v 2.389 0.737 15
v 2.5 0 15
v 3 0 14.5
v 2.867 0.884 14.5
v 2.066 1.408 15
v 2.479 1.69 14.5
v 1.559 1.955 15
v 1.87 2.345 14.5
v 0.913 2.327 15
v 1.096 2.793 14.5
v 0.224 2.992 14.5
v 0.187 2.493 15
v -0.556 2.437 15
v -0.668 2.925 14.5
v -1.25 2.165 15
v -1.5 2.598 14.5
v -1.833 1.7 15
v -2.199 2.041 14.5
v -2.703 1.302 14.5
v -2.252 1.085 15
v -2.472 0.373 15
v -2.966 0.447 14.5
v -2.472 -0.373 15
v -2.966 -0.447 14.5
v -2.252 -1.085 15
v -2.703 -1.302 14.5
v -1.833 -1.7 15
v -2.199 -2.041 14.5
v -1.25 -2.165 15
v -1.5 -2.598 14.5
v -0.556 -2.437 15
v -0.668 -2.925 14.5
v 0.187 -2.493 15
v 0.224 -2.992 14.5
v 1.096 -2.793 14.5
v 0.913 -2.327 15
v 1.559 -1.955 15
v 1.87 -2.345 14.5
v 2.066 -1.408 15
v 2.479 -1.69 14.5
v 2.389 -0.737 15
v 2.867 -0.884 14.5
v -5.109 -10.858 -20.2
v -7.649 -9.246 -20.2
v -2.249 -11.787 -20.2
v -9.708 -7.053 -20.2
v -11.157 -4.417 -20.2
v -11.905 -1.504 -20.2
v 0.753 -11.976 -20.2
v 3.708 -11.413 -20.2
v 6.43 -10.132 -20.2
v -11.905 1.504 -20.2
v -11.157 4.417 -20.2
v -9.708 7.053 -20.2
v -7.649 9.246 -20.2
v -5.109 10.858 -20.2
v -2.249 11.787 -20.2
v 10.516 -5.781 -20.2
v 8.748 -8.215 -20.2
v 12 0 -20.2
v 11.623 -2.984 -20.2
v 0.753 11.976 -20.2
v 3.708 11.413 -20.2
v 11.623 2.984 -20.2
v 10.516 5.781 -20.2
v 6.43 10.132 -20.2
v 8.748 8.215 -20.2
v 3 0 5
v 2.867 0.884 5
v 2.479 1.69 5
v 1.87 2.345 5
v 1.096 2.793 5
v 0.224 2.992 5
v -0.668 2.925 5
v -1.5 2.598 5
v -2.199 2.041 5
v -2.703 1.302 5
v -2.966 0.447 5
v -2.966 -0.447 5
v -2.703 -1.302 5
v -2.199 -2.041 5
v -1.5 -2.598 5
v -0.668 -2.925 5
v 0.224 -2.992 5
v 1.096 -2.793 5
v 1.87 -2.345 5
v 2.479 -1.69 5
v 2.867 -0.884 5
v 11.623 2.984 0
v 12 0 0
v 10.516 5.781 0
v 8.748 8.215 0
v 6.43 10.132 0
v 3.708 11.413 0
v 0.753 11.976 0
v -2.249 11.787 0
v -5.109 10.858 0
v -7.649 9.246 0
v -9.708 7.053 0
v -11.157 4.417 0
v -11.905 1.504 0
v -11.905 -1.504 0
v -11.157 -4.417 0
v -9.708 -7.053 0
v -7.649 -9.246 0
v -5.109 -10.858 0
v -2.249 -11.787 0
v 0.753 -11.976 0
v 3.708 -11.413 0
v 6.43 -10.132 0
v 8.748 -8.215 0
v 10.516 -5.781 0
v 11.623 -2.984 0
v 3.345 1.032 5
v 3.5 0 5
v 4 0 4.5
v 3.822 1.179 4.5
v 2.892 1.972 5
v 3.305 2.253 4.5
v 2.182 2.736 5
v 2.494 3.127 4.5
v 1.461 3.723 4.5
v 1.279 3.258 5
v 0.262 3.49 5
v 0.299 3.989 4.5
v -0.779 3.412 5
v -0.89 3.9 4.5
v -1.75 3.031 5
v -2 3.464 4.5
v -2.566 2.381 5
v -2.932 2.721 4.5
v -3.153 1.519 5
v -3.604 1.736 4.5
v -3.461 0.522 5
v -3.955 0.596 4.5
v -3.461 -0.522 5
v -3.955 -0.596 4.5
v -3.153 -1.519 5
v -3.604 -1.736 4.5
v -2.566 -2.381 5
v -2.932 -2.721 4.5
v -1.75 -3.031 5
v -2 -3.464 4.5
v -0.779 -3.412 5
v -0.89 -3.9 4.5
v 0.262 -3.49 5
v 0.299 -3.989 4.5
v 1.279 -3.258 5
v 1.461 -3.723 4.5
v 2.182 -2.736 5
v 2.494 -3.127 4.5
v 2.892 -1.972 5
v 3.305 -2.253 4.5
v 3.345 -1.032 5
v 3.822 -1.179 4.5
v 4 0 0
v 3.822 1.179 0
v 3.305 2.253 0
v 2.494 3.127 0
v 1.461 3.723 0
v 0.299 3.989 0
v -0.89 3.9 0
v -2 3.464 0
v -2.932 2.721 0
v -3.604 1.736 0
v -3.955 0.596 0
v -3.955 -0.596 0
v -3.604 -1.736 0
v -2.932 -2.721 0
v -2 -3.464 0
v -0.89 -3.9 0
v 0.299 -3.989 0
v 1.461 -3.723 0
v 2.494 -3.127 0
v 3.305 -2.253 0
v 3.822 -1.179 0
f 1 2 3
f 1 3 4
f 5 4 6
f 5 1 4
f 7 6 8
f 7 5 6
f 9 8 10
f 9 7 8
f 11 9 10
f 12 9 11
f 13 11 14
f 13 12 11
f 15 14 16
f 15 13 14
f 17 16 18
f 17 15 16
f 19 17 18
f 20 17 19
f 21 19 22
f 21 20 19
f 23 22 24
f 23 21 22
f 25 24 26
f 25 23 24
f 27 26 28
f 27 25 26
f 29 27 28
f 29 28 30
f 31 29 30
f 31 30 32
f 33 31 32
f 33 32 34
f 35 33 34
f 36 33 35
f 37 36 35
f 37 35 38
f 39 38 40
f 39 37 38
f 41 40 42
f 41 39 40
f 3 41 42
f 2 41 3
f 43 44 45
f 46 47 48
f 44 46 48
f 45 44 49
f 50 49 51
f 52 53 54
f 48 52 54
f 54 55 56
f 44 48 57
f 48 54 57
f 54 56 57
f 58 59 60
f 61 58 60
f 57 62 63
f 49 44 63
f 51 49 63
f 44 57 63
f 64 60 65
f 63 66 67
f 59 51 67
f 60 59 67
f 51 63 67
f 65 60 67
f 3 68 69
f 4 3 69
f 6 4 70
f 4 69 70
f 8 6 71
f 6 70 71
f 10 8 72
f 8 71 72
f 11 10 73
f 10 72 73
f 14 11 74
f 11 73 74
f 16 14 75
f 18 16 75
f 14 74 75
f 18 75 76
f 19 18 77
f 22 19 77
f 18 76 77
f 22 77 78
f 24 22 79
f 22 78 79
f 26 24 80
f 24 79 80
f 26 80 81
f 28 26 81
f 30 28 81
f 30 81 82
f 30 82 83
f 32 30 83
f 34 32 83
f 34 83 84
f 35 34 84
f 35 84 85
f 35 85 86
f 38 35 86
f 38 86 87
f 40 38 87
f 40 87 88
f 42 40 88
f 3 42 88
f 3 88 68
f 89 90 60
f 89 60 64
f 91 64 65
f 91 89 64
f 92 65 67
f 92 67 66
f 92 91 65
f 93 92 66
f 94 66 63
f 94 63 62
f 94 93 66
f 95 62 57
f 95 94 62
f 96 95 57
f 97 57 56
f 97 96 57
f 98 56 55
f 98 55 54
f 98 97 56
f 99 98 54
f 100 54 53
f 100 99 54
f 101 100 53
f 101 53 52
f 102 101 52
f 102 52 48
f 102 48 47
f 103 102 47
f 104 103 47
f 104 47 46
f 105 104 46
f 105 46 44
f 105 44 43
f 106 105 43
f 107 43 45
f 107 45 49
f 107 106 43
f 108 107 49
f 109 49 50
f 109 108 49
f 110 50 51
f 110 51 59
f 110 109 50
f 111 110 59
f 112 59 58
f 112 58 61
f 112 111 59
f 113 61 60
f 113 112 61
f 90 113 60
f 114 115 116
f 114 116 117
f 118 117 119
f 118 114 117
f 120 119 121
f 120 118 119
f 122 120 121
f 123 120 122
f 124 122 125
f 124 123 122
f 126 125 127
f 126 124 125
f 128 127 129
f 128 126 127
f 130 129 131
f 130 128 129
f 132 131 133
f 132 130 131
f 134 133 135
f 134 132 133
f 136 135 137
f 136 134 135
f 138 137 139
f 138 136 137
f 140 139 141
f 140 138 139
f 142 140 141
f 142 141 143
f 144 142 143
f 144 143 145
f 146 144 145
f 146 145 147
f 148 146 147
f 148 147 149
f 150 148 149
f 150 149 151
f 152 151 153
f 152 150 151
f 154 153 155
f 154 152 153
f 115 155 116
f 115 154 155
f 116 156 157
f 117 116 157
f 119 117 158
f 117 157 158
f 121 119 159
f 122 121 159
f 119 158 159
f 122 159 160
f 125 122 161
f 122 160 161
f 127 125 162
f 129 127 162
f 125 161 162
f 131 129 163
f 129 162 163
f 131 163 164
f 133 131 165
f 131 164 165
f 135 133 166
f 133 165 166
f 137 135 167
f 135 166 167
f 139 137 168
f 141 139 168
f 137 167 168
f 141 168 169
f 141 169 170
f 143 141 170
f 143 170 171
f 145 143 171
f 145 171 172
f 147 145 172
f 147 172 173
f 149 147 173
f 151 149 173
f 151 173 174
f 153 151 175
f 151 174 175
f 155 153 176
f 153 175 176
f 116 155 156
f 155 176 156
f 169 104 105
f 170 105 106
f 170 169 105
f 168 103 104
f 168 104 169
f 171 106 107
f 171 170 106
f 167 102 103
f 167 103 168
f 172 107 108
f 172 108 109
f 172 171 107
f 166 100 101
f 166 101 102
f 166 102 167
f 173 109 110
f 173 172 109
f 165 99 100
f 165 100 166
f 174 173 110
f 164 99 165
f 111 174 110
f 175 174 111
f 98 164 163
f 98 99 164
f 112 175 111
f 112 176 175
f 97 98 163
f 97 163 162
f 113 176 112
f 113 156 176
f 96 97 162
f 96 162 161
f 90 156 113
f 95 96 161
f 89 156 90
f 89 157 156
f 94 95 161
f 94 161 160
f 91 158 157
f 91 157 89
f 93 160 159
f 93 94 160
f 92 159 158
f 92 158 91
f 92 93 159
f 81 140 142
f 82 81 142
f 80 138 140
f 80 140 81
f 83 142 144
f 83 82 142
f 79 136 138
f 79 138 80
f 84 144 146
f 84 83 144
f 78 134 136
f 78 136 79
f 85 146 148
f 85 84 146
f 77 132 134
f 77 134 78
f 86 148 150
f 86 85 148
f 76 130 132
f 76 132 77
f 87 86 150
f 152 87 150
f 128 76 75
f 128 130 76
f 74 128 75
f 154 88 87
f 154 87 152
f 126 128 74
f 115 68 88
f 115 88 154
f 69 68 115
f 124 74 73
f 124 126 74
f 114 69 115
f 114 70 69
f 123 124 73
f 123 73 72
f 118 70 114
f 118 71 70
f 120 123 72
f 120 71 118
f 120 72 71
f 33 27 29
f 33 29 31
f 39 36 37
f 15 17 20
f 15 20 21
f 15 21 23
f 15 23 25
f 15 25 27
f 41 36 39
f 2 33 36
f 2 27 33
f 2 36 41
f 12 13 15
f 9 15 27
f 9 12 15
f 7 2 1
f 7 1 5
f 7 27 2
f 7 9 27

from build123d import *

# Parameters (mm, degrees)
SKETCH_R     = 12
PAD_DEPTH    = 20.2
SKETCH001_R  = 3
PAD001_DEPTH = 15
SKETCH002_R  = 4
PAD002_DEPTH = 5
CHAMFER_SIZE = 0.5


with BuildPart() as part:
    # Sketch → Pad (new body)
    with BuildSketch(Plane.XY):
        Circle(SKETCH_R)
    extrude(amount=-PAD_DEPTH)

    # Sketch001 → Pad001 (join)
    with BuildSketch(Plane.XY):
        Circle(SKETCH001_R)
    extrude(amount=PAD001_DEPTH)

    # Sketch002 → Pad002 (join)
    with BuildSketch(Plane.XY):
        Circle(SKETCH002_R)
    extrude(amount=PAD002_DEPTH)

    # Chamfer
    chamfer_edges = [part.edges().sort_by_distance(p)[0] for p in [
        (-4, 0, 5),
        (-3, 0, 15),
    ]]
    chamfer(chamfer_edges, length=CHAMFER_SIZE)


solid = part.part
